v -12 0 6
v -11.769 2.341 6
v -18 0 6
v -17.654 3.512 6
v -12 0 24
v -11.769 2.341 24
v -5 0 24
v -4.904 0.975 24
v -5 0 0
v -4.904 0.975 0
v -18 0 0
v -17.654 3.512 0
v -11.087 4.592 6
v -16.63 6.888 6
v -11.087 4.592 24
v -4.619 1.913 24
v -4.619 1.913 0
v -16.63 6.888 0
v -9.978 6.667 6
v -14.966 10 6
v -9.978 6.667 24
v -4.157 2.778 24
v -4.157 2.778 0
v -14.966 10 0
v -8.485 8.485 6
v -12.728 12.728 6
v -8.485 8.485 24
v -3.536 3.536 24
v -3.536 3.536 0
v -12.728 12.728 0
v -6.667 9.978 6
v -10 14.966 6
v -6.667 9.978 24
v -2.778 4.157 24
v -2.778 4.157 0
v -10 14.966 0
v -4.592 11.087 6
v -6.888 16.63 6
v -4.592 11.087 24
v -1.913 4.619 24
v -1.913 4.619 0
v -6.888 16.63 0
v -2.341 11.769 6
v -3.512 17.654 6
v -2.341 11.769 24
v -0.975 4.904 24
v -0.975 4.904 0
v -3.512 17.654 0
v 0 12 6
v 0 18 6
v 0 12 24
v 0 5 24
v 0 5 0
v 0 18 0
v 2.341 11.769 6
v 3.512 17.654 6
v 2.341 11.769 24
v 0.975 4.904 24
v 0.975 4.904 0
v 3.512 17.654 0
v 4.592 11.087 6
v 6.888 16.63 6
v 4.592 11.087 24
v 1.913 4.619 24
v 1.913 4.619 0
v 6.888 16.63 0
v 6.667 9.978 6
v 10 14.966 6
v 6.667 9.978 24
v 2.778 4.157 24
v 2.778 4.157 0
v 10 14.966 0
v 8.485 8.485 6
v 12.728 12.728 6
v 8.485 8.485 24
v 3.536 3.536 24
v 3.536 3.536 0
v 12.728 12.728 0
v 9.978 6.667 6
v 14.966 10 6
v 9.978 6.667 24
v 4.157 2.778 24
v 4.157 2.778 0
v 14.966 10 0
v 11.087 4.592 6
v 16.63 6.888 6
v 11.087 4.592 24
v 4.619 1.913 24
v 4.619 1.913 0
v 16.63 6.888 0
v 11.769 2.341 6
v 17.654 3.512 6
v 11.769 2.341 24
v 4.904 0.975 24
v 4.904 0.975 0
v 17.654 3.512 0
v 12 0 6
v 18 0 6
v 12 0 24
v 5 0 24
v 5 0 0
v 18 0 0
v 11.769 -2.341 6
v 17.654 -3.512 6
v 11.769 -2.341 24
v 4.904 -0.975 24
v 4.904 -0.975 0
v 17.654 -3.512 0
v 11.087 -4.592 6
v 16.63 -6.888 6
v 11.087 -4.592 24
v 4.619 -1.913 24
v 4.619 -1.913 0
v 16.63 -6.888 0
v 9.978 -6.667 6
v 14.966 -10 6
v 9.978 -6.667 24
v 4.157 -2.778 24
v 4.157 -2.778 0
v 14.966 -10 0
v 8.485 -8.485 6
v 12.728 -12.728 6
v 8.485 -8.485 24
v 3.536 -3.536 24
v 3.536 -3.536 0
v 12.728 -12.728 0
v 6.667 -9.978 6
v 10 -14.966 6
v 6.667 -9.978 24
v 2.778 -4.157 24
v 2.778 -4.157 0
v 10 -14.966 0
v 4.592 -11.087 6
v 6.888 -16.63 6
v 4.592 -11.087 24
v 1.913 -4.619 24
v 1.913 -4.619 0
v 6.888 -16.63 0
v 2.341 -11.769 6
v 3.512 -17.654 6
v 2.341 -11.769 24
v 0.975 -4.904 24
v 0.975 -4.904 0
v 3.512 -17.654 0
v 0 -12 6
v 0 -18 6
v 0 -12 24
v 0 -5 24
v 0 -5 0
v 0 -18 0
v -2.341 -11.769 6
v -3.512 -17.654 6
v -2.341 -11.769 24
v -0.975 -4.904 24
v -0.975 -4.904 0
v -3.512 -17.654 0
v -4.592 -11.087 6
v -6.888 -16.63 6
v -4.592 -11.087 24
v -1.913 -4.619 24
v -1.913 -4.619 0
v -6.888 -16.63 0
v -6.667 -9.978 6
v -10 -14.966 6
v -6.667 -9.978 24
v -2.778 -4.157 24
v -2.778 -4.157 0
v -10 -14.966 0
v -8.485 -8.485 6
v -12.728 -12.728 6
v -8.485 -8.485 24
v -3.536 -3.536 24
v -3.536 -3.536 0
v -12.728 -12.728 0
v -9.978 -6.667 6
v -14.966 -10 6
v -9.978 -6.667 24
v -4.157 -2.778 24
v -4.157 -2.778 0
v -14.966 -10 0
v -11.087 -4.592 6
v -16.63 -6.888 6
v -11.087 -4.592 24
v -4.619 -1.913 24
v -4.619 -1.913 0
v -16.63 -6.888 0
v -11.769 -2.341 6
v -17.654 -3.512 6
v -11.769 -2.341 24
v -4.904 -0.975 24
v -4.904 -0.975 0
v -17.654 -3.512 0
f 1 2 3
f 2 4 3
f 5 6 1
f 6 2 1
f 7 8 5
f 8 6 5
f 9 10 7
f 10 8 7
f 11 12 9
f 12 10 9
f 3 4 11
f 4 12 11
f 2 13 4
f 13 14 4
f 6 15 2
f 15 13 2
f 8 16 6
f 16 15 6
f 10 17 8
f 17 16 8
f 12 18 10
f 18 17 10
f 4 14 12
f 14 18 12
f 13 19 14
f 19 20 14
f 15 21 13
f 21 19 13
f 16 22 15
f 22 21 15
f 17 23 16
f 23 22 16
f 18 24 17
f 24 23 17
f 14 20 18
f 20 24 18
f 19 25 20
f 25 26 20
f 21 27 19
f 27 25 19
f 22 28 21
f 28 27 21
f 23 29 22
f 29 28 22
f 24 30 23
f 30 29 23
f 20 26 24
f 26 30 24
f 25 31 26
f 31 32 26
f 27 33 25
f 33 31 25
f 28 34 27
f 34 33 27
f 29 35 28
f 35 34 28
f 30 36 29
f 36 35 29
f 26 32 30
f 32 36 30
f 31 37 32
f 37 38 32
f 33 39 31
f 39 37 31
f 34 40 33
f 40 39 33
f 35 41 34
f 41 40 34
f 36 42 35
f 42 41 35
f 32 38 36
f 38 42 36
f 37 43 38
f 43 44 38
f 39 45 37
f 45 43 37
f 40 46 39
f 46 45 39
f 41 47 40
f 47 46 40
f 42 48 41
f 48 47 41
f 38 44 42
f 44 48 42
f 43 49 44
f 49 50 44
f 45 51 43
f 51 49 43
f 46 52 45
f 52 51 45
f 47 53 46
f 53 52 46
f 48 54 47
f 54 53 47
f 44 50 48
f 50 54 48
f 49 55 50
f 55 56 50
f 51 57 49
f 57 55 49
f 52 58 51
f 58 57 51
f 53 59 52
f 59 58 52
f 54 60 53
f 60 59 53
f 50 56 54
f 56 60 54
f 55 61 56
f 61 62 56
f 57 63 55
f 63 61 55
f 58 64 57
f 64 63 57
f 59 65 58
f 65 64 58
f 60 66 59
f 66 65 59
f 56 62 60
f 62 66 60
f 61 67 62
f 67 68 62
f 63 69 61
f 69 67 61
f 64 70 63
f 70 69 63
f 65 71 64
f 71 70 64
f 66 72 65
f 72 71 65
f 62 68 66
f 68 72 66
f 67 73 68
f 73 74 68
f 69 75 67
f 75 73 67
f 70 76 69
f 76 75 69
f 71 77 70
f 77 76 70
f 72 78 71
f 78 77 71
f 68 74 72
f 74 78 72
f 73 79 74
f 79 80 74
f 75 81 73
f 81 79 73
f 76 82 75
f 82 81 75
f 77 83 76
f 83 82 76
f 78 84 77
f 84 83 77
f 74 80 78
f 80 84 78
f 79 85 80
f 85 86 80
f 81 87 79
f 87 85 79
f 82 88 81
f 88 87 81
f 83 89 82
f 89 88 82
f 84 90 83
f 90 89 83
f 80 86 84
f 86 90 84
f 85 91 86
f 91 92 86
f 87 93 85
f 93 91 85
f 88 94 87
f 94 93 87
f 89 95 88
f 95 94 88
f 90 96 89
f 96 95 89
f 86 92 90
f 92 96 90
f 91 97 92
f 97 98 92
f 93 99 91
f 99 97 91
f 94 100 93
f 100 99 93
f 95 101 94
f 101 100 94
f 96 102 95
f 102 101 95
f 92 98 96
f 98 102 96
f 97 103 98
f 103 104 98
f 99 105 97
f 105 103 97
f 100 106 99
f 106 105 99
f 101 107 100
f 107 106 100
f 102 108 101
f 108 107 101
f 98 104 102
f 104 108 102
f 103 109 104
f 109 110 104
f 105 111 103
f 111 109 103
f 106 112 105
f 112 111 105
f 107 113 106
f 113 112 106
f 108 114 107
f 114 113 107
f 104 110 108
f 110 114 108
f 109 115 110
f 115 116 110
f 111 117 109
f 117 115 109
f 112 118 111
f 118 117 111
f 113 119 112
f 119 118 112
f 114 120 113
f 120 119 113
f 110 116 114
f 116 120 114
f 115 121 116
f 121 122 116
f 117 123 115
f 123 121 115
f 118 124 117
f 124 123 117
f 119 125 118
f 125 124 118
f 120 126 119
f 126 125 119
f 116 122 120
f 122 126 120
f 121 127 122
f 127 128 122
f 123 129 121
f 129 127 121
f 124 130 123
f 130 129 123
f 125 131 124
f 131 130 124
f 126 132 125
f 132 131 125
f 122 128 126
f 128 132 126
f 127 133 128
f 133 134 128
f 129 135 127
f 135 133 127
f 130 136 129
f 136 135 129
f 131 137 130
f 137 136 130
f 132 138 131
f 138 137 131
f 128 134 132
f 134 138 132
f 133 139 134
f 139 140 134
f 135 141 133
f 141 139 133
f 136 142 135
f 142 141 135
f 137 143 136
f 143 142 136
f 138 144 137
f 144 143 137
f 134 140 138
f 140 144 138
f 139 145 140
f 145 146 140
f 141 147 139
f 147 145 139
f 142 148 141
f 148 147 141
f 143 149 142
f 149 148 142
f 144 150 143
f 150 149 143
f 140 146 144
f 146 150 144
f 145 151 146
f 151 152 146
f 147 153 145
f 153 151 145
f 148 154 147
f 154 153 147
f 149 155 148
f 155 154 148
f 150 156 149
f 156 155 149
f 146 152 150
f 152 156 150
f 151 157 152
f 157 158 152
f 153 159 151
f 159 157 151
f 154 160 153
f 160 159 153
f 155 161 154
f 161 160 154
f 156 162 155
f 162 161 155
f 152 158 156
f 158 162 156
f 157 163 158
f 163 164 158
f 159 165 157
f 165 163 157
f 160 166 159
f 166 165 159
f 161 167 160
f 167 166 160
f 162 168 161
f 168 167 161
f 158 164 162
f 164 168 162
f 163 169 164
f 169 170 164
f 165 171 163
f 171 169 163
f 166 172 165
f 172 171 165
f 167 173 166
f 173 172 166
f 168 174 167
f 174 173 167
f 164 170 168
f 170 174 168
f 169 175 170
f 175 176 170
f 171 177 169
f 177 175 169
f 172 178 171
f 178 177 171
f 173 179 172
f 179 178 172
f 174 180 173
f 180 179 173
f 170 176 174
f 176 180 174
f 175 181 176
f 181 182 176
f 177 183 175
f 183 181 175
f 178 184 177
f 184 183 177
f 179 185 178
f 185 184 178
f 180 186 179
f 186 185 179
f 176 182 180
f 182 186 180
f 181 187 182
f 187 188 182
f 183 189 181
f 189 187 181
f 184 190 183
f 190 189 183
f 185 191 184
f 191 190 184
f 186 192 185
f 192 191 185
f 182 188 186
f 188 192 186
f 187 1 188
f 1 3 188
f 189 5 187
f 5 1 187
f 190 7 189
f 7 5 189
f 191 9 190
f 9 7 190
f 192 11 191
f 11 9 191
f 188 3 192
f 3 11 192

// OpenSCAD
$fn = 32;

// ----------------------------------------------------------------------
// Revolved part: flanged bushing R18
// ----------------------------------------------------------------------

// --- parameters (mm) ---
bore_r = 5;               // bore radius
flange_r = 18;            // flange radius
flange_h = 6;             // flange thickness
sleeve_r = 12;            // sleeve radius
total_h = 24;             // overall height
revolve_angle = 360;      // revolve sweep, degrees

bore_d = 2 * bore_r;
flange_d = 2 * flange_r;
sleeve_d = 2 * sleeve_r;

profile = [[5, 0], [18, 0], [18, 6], [12, 6], [12, 24], [5, 24]];  // primary outline, 6 points, counter clockwise

// --- the one profile operation ---
rotate_extrude(angle = revolve_angle) polygon(points = profile);
